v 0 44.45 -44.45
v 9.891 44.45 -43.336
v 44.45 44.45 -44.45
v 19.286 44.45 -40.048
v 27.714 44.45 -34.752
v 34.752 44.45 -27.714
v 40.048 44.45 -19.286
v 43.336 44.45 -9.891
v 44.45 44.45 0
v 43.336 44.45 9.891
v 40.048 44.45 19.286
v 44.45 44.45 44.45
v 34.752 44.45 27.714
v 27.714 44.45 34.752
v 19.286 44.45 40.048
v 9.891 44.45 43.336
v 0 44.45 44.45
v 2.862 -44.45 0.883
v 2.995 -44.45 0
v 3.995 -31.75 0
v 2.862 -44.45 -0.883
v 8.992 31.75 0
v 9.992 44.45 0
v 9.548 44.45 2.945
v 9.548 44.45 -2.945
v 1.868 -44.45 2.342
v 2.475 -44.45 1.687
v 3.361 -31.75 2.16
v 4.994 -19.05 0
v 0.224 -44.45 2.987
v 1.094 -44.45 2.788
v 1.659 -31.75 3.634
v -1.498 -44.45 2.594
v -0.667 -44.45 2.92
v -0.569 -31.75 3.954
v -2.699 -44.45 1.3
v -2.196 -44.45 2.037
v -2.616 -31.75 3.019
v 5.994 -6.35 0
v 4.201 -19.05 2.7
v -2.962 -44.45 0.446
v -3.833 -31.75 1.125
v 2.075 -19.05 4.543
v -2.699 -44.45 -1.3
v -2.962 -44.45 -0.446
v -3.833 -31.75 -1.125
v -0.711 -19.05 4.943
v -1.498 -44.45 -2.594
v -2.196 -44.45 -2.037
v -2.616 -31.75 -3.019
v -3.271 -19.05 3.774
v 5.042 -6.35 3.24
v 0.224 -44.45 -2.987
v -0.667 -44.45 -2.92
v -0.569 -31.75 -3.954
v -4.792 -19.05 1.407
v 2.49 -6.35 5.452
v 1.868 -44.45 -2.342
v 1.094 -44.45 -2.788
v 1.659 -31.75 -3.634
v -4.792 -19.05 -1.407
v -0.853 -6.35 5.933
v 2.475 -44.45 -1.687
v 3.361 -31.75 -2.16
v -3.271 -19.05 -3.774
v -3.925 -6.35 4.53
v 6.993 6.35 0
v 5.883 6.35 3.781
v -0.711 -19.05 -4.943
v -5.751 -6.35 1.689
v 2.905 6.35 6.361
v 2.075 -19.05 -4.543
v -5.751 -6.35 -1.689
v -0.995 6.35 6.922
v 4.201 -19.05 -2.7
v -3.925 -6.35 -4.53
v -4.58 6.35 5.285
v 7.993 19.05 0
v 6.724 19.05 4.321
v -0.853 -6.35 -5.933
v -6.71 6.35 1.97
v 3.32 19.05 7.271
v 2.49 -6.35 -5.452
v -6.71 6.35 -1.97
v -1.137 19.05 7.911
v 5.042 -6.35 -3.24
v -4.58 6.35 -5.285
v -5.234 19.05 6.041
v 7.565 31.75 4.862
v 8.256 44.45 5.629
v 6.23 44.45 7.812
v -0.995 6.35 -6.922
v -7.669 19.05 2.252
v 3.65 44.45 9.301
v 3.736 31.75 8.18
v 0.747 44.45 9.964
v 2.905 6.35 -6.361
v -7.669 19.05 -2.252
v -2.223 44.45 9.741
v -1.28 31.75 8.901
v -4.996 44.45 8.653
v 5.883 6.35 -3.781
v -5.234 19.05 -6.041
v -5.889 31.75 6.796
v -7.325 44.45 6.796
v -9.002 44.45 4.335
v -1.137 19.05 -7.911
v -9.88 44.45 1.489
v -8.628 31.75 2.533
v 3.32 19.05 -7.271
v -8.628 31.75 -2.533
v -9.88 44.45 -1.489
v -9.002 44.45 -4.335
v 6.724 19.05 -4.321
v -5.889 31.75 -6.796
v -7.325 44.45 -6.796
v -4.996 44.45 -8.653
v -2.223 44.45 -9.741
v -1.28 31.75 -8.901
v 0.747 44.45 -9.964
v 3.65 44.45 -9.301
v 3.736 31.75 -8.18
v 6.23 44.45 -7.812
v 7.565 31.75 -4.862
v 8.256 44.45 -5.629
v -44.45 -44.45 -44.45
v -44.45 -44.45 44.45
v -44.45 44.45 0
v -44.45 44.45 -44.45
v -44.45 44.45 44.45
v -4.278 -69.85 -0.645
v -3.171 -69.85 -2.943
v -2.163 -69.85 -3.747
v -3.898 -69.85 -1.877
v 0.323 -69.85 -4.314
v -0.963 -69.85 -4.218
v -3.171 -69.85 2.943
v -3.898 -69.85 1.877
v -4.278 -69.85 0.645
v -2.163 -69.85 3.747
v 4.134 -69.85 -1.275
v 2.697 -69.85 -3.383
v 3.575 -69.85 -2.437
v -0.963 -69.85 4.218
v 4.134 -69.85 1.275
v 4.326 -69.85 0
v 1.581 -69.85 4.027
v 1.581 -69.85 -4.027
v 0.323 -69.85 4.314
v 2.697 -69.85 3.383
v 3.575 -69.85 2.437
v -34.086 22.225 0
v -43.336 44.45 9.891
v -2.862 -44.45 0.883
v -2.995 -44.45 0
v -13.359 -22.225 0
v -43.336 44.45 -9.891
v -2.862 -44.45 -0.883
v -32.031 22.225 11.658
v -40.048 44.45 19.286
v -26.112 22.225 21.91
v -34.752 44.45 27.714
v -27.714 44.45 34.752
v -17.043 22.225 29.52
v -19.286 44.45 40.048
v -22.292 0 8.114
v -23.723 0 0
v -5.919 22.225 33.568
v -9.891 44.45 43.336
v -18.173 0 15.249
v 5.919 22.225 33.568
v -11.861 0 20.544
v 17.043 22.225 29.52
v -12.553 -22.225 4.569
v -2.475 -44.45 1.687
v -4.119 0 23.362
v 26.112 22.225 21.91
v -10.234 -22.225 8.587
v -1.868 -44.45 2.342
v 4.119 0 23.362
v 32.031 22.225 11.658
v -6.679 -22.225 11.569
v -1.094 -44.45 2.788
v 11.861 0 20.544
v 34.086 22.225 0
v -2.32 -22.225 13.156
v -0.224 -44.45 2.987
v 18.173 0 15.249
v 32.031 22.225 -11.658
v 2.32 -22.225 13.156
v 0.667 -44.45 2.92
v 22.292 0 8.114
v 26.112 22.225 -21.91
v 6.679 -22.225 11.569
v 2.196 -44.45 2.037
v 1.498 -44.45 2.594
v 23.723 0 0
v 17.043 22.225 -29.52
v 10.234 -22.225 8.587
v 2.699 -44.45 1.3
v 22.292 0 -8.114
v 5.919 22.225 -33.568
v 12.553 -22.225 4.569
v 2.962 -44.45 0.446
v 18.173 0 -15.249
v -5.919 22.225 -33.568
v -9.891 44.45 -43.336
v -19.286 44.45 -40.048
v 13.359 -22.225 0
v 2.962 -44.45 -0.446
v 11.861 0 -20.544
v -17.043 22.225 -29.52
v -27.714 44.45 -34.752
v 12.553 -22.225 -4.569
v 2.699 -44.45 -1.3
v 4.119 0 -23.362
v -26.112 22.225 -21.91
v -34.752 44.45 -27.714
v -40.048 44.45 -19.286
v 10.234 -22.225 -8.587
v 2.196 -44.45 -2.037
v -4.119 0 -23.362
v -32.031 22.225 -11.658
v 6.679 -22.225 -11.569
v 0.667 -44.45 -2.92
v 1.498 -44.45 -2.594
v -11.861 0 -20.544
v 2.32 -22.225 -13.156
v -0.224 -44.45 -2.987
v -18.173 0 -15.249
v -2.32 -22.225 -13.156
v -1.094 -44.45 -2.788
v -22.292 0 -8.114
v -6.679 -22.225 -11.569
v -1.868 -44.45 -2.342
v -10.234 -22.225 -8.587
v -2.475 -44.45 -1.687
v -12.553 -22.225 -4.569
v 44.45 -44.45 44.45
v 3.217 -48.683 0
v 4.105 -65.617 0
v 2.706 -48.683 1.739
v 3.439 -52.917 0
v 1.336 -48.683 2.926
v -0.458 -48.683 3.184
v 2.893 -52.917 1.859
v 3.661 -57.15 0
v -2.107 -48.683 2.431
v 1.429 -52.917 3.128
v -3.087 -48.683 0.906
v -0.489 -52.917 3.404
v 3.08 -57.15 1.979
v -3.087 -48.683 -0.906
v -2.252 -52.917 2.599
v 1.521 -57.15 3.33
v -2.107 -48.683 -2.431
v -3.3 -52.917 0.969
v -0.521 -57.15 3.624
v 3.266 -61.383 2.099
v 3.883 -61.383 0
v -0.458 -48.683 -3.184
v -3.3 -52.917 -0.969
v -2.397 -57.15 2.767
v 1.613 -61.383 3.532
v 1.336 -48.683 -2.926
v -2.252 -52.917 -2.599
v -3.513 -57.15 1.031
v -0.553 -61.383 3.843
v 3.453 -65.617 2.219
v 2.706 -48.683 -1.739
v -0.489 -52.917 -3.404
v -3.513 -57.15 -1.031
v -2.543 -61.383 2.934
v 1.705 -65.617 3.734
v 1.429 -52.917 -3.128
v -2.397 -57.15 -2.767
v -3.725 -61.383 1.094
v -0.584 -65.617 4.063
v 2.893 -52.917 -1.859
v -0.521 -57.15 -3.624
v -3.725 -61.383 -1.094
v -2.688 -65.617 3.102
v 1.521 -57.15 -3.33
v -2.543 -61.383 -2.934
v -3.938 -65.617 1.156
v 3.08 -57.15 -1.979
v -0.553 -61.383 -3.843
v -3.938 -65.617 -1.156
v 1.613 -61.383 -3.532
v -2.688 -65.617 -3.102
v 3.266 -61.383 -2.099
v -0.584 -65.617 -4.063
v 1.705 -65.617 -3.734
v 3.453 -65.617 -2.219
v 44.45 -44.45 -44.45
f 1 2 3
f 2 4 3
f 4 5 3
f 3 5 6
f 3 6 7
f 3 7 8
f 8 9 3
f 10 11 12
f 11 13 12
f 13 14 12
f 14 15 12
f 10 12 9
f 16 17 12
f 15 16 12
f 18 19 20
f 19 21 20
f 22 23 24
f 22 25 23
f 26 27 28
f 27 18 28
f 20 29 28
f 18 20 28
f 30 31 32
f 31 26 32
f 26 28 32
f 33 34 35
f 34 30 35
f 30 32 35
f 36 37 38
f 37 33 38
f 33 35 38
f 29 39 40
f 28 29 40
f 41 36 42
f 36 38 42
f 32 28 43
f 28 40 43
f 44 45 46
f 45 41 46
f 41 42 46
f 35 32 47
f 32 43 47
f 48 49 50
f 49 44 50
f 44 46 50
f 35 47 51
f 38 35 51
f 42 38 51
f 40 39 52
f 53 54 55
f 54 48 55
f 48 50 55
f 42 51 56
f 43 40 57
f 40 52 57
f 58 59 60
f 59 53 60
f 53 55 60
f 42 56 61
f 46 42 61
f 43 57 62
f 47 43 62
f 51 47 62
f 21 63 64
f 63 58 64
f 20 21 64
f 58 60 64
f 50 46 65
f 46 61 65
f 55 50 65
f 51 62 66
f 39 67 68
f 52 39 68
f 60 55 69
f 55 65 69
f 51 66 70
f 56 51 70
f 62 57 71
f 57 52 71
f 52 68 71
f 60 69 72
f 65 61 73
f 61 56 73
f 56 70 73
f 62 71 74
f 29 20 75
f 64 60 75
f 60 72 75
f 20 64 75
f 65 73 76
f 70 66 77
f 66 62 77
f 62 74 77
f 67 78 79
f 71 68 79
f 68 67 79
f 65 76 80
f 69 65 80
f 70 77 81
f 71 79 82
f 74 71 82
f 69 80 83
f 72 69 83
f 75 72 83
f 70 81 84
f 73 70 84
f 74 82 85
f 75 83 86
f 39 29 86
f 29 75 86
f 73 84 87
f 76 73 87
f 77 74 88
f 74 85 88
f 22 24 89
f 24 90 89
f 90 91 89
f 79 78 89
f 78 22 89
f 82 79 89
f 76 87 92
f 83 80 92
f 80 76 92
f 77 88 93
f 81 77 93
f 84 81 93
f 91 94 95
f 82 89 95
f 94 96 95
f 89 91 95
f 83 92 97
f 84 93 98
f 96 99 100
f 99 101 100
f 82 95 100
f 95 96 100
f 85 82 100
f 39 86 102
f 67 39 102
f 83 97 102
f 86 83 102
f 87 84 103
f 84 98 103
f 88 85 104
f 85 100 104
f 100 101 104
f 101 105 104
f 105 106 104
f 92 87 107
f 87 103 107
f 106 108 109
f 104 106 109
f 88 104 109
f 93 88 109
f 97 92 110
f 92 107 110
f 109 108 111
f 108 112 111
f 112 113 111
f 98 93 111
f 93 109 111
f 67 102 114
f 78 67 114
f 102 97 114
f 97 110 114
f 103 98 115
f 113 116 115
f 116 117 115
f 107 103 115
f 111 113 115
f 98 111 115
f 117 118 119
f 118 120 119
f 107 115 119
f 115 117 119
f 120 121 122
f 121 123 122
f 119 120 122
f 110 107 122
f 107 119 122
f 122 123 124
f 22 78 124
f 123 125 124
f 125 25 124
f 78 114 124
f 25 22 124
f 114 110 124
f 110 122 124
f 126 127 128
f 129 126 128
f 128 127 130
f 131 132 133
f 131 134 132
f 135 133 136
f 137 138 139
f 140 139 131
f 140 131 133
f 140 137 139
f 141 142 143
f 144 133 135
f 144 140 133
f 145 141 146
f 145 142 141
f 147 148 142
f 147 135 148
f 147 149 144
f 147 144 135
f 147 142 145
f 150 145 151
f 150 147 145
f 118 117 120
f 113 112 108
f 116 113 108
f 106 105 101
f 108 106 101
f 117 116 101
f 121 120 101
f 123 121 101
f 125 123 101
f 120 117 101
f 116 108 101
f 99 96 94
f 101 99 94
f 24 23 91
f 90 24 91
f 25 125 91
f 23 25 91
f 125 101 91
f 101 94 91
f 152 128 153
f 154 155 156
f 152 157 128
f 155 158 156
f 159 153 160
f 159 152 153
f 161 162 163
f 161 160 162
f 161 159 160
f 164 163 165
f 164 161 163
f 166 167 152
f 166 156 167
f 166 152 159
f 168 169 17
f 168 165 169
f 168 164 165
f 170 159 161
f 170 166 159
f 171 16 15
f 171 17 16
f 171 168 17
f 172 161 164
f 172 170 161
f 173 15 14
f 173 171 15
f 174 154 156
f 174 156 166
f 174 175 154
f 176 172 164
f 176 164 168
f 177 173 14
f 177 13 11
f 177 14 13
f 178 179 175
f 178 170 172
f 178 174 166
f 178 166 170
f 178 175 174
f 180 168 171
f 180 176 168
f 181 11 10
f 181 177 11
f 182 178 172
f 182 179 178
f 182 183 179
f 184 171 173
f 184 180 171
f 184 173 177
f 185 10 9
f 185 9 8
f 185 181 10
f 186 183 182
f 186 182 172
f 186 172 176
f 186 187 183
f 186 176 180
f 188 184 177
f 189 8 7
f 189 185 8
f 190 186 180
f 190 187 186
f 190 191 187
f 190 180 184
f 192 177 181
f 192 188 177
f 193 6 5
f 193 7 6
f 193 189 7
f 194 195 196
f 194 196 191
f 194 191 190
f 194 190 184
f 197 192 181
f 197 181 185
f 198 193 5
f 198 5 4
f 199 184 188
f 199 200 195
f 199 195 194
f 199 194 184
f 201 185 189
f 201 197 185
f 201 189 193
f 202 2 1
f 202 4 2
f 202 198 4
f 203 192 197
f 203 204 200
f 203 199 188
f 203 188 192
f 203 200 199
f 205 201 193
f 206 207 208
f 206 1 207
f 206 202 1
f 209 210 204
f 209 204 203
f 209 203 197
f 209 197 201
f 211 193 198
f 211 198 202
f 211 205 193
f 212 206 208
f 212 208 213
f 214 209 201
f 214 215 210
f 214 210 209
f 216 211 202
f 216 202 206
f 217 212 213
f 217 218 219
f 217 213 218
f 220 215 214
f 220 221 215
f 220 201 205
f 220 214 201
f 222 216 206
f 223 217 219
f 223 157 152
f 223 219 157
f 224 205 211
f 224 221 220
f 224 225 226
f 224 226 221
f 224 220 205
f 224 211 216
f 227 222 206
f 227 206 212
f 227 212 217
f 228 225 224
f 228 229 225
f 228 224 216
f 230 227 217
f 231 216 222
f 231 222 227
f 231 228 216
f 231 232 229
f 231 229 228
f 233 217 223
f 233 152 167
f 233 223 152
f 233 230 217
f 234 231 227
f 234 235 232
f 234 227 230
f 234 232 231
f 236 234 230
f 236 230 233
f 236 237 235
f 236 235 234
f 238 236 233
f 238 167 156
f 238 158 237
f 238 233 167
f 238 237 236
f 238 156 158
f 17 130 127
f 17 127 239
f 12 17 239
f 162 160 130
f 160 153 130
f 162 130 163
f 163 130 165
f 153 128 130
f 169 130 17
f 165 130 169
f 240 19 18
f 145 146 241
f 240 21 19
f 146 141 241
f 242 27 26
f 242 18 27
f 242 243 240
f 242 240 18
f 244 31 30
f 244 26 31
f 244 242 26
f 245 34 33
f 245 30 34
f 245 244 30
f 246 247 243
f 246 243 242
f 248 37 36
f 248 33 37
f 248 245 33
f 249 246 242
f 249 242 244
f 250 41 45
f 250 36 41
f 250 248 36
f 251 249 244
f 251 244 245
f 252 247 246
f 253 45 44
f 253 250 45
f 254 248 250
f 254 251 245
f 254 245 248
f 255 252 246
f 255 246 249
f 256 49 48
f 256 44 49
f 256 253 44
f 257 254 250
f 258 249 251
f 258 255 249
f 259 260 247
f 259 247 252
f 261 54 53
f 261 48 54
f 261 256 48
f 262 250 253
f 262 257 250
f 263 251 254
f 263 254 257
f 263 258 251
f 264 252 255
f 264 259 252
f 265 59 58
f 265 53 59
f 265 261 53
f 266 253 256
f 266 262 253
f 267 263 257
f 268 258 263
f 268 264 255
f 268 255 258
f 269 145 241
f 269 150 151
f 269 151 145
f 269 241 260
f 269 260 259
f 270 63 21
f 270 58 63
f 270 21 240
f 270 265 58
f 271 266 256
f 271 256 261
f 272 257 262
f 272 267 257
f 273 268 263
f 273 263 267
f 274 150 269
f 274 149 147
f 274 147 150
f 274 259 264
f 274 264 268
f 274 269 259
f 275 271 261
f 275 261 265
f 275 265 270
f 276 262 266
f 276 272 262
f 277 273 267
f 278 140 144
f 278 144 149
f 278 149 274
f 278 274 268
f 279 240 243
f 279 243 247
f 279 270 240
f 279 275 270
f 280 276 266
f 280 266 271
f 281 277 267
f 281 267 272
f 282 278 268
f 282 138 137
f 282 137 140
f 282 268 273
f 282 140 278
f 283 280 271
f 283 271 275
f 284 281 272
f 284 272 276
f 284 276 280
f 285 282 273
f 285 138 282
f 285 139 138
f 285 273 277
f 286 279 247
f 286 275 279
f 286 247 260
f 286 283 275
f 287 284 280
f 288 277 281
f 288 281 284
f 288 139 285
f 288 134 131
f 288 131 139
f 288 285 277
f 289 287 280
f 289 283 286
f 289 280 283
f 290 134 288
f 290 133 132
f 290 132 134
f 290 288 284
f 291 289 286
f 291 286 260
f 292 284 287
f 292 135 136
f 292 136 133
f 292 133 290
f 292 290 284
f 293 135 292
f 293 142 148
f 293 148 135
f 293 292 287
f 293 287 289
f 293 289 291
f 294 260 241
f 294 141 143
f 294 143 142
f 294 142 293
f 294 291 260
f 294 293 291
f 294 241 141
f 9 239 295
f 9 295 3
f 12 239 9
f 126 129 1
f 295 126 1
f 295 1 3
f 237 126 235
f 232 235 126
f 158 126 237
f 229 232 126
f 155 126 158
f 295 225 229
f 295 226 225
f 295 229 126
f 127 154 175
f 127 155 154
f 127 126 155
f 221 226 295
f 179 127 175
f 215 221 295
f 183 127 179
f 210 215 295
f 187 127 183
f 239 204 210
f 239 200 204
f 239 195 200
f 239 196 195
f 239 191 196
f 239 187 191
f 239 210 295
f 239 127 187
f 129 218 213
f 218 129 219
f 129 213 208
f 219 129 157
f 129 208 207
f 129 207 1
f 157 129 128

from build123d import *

# Parameters (mm, degrees)
F0_W          = 88.9
F0_H          = 88.9
F1_DEPTH      = 44.45
F1_DEPTH_BACK = 44.45
F2_R          = 44.45
F3_DEPTH      = 88.901
F3_TAPER      = 25
F4_R          = 2.99524919
F5_DEPTH      = 88.9
F5_TAPER      = -4.5
F5_DEPTH_BACK = 25.4
F5_TAPER_BACK = -3


with BuildPart() as f1:
    # F0 (on Top) → F1 (new body, two sides)
    with BuildSketch(Plane.XY) as f1_sk:
        Rectangle(F0_W, F0_H)
    extrude(amount=F1_DEPTH)
    extrude(f1_sk.sketch, amount=-F1_DEPTH_BACK)

    # F2 (on face) → F3 (cut, through all)
    with BuildSketch(Plane(origin=(0, 44.45, 0), x_dir=(-1, 0, 0), z_dir=(0, 1, 0))):
        Circle(F2_R)
    extrude(amount=-F3_DEPTH, taper=F3_TAPER, mode=Mode.SUBTRACT)


with BuildPart() as f5:
    # F4 (on face) → F5 (new body, two sides)
    with BuildSketch(Plane.XZ.offset(44.45)) as f5_sk:
        Circle(F4_R)
    extrude(amount=-F5_DEPTH, taper=F5_TAPER)
    extrude(f5_sk.sketch, amount=F5_DEPTH_BACK, taper=F5_TAPER_BACK)


solid = Compound([f1.part, f5.part])
